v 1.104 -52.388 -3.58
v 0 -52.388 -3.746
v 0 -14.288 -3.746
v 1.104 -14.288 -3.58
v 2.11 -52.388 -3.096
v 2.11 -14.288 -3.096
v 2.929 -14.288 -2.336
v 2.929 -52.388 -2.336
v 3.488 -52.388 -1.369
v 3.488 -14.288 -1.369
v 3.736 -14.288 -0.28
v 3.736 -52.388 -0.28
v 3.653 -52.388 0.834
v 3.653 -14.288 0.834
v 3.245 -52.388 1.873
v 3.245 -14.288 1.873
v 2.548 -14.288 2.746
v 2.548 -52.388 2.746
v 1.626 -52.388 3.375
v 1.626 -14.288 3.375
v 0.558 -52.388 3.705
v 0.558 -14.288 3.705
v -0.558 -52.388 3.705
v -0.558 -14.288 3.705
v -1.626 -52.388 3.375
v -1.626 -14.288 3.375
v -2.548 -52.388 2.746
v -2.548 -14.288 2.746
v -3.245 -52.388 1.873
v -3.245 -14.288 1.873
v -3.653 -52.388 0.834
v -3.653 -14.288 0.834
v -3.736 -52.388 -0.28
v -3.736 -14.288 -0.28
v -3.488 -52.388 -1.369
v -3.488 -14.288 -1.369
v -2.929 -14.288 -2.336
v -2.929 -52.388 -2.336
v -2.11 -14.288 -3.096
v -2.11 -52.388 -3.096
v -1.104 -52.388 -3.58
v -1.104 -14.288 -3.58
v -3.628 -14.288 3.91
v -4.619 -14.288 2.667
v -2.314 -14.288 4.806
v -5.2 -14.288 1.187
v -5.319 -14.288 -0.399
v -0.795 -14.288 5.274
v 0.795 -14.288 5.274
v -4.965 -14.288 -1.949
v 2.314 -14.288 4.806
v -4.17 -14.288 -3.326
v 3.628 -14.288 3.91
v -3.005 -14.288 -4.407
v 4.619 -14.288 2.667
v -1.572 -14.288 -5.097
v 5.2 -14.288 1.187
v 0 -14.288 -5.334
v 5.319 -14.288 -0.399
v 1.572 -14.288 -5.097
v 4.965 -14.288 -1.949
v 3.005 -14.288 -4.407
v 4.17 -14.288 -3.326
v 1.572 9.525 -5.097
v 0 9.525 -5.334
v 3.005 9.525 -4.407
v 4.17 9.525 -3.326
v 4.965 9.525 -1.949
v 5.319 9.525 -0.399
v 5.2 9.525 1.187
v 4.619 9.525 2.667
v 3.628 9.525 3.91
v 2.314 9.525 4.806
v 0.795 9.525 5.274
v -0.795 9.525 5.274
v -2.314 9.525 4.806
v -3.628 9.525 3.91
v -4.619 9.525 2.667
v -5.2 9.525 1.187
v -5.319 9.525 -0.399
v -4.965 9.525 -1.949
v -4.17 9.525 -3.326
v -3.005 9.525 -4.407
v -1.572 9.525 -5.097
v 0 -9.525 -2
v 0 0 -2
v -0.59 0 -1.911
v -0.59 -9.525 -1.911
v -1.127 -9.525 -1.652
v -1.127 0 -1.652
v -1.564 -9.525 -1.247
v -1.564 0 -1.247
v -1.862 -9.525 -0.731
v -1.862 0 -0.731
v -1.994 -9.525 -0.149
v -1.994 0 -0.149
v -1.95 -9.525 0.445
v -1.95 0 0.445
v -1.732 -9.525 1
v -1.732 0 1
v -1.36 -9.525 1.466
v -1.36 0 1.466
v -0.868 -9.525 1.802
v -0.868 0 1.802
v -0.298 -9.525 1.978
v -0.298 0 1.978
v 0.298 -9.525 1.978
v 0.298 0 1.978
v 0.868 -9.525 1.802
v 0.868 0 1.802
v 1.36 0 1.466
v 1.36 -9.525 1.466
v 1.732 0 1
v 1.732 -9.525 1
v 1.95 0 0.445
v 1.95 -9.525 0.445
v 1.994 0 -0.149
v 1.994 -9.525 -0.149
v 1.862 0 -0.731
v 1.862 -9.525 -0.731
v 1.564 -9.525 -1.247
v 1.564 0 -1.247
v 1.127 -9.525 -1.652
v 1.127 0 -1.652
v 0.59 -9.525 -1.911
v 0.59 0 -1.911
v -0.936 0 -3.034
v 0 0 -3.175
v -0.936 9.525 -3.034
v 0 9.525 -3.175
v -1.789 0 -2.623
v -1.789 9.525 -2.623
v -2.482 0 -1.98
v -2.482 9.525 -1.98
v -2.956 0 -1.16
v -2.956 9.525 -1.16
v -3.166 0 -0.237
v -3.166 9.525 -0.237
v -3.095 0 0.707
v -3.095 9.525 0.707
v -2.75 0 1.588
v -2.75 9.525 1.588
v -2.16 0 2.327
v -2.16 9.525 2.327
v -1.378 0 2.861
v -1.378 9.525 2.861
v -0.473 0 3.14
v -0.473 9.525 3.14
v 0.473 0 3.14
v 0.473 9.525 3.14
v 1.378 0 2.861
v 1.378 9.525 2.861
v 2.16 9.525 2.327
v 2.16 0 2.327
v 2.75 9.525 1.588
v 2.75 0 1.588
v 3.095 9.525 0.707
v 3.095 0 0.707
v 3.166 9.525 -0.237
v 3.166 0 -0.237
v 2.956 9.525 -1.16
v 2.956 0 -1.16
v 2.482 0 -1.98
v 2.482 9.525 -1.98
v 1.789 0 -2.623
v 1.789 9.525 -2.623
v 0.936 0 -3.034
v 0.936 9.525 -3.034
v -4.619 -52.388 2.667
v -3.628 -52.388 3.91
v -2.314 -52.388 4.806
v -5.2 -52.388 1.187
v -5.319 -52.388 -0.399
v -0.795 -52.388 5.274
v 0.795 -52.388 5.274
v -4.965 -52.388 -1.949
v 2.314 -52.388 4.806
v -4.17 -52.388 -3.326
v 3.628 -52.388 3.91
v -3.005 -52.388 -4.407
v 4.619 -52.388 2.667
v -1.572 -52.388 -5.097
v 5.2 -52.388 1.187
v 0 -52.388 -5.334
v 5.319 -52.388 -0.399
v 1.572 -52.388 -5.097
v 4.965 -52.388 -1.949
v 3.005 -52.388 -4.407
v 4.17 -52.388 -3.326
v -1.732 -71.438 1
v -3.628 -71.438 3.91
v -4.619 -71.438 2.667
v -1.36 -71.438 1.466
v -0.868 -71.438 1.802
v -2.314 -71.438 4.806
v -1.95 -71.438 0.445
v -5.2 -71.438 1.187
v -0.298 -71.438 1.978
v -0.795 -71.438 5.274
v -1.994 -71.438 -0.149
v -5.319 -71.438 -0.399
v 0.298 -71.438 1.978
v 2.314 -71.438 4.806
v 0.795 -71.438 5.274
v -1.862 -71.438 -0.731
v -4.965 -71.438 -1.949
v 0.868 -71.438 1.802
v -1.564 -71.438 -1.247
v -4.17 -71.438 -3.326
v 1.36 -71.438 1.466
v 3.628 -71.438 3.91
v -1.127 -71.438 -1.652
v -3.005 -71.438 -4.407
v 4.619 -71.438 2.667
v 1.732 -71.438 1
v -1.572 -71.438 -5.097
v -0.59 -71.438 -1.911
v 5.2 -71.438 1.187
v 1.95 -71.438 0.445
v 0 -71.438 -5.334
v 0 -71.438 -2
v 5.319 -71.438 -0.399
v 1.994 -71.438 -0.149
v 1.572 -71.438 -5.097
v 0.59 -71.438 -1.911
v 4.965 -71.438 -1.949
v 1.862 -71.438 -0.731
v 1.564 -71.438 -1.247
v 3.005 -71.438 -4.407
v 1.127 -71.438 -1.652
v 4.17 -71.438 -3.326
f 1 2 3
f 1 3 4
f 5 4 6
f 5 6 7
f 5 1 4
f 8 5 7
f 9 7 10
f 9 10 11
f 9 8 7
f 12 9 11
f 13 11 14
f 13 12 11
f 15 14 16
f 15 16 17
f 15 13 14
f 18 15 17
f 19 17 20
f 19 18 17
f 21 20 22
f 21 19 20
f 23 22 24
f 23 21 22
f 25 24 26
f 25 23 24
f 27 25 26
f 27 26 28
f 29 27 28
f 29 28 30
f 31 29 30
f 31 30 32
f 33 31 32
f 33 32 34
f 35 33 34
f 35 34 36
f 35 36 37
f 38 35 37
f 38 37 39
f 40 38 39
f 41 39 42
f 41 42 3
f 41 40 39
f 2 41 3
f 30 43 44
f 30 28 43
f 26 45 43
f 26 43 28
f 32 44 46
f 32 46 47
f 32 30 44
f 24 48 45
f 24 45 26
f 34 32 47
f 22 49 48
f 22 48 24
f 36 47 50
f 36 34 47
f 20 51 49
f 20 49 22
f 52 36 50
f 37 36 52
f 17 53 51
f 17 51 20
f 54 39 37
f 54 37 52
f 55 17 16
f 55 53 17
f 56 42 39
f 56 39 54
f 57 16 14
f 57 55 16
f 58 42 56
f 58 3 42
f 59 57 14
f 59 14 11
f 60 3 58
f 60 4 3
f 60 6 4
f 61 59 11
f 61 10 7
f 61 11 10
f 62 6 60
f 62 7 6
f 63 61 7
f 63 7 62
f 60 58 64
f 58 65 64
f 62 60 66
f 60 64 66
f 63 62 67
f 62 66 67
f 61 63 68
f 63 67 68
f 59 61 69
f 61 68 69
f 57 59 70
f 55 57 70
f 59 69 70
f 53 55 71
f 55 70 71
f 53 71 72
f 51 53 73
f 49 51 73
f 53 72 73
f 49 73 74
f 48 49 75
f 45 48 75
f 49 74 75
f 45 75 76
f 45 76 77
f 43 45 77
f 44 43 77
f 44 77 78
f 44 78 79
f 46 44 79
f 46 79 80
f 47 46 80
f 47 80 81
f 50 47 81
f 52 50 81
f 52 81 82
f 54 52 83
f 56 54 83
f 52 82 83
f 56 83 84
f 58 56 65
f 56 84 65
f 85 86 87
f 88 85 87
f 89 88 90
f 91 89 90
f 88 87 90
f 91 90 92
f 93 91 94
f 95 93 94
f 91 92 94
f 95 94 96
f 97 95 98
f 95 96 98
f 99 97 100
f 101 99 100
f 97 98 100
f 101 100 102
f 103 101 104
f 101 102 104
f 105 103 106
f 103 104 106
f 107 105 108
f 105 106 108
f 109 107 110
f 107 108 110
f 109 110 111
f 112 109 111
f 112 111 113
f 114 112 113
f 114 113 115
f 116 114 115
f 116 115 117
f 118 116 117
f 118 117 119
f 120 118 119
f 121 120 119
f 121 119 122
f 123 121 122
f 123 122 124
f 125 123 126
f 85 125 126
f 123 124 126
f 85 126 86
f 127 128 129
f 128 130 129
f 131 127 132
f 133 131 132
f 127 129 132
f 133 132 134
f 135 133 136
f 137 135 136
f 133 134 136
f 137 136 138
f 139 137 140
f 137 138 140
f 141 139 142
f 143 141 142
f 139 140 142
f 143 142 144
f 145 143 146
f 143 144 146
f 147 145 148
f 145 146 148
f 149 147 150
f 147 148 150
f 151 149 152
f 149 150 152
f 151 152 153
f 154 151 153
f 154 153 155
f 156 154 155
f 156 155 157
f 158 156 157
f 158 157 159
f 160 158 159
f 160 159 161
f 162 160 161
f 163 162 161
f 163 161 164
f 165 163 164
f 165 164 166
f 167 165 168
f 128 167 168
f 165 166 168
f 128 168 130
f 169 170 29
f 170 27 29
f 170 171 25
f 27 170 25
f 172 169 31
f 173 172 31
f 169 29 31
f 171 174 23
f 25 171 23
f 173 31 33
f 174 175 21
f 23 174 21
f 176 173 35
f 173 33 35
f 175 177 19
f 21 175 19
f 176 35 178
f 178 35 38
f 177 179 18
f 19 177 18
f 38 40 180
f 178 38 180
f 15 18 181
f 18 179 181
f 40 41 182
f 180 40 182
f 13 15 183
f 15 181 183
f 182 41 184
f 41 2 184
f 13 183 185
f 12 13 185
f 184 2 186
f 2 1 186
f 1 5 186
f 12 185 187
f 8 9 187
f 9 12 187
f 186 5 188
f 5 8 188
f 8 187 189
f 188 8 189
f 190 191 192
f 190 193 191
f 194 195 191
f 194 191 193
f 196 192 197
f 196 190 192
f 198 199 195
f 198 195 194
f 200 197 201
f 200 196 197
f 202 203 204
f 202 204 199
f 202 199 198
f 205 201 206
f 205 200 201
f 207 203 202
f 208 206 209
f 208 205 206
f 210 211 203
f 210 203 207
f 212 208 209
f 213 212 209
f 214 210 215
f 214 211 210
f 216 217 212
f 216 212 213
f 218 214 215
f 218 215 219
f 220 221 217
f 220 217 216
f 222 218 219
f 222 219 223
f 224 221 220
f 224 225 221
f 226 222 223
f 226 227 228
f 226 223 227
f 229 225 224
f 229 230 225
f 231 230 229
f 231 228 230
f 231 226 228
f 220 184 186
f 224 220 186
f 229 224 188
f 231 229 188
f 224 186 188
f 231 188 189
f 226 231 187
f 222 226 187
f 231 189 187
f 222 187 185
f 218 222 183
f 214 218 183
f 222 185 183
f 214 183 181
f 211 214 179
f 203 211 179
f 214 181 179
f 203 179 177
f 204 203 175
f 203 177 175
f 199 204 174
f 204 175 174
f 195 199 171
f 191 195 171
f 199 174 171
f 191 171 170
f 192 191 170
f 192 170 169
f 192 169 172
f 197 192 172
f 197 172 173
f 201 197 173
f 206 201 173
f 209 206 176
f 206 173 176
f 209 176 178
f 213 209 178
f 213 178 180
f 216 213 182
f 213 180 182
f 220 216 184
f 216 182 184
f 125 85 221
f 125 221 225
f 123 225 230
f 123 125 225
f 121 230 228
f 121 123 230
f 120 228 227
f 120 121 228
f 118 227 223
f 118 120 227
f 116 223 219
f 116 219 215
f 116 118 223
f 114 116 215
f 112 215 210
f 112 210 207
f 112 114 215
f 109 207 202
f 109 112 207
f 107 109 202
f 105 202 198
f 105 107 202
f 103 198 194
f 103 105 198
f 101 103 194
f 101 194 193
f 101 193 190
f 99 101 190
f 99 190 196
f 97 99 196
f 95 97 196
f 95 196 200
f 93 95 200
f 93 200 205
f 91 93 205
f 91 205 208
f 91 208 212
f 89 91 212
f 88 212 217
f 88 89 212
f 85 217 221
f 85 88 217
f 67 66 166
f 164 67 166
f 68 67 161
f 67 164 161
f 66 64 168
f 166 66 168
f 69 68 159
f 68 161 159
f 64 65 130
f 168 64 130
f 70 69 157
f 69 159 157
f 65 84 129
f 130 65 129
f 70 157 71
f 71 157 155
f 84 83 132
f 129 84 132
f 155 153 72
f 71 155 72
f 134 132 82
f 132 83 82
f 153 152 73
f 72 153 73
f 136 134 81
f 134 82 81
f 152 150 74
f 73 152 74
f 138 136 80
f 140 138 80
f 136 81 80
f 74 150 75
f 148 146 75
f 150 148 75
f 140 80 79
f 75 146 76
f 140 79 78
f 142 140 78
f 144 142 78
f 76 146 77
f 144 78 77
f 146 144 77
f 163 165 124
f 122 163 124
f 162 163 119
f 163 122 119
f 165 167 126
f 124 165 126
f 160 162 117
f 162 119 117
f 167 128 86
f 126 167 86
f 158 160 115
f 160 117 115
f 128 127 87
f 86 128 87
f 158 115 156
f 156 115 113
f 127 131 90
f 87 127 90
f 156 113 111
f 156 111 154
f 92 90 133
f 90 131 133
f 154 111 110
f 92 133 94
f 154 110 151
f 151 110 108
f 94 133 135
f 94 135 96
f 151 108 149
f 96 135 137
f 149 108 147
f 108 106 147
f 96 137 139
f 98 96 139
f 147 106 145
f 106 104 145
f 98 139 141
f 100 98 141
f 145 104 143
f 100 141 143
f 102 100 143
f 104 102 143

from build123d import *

# Parameters (mm, degrees)
SKETCH2_R           = 5.334
SKETCH2_R_2         = 2
BOSS_EXTRUDE1_DEPTH = 61.9125
CUT_EXTRUDE1_START  = -19.05
SKETCH3_R           = 5.334
SKETCH3_R_2         = 3.7465
CUT_EXTRUDE1_DEPTH  = 38.1


with BuildPart() as part:
    # Sketch1 → Revolve1 (revolve)
    with BuildSketch(Plane.XY, mode=Mode.PRIVATE) as revolve1_sk:
        Polygon((2, 0), (3.175, 0), (3.175, 9.525), (5.334, 9.525), (5.334, -9.525), (2, -9.525), align=None)
    revolve(revolve1_sk.sketch.rotate(Axis((0, 0, 0), (0, 1, 0)), 90), axis=Axis((0, 0, 0), (0, 1, 0)))

    # Sketch2 → Boss-Extrude1 (add)
    with BuildSketch(Plane.XZ.offset(9.525)):
        with Locations(Location((0, 0, 0), (0, 0, 270))):
            Circle(SKETCH2_R)
        with Locations(Location((0, 0, 0), (0, 0, 270))):
            Circle(SKETCH2_R_2, mode=Mode.SUBTRACT)
    extrude(amount=BOSS_EXTRUDE1_DEPTH)

    # Sketch3 → Cut-Extrude1 (cut)
    with BuildSketch(Plane.XZ.offset(71.4375).offset(CUT_EXTRUDE1_START)):
        with Locations(Location((0, 0, 0), (0, 0, 270))):
            Circle(SKETCH3_R)
        with Locations(Location((0, 0, 0), (0, 0, 270))):
            Circle(SKETCH3_R_2, mode=Mode.SUBTRACT)
    extrude(amount=-CUT_EXTRUDE1_DEPTH, mode=Mode.SUBTRACT)


solid = part.part
